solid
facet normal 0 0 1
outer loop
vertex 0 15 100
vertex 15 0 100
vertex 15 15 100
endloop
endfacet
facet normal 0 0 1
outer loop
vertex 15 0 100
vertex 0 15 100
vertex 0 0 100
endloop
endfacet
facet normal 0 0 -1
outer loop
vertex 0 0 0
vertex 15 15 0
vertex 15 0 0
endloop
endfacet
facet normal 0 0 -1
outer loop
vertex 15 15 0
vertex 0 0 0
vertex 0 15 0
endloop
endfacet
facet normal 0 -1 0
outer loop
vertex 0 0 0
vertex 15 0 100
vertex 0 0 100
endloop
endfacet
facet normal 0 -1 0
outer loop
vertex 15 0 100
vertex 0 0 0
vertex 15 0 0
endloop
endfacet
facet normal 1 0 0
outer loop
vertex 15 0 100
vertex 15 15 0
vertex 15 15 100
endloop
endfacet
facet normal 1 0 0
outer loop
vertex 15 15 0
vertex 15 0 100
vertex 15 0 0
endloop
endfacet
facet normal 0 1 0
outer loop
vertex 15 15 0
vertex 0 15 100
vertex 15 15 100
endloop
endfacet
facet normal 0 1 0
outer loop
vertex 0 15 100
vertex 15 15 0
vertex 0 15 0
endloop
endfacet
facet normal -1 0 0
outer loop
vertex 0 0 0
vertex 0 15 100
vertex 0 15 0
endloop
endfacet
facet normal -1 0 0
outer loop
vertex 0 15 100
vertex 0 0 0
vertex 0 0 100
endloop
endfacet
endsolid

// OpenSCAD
$fn = 64;

length = 100;
size = 15;

color([0.75, 0.75, 0.78])
cube([size, size, length], center=false);
